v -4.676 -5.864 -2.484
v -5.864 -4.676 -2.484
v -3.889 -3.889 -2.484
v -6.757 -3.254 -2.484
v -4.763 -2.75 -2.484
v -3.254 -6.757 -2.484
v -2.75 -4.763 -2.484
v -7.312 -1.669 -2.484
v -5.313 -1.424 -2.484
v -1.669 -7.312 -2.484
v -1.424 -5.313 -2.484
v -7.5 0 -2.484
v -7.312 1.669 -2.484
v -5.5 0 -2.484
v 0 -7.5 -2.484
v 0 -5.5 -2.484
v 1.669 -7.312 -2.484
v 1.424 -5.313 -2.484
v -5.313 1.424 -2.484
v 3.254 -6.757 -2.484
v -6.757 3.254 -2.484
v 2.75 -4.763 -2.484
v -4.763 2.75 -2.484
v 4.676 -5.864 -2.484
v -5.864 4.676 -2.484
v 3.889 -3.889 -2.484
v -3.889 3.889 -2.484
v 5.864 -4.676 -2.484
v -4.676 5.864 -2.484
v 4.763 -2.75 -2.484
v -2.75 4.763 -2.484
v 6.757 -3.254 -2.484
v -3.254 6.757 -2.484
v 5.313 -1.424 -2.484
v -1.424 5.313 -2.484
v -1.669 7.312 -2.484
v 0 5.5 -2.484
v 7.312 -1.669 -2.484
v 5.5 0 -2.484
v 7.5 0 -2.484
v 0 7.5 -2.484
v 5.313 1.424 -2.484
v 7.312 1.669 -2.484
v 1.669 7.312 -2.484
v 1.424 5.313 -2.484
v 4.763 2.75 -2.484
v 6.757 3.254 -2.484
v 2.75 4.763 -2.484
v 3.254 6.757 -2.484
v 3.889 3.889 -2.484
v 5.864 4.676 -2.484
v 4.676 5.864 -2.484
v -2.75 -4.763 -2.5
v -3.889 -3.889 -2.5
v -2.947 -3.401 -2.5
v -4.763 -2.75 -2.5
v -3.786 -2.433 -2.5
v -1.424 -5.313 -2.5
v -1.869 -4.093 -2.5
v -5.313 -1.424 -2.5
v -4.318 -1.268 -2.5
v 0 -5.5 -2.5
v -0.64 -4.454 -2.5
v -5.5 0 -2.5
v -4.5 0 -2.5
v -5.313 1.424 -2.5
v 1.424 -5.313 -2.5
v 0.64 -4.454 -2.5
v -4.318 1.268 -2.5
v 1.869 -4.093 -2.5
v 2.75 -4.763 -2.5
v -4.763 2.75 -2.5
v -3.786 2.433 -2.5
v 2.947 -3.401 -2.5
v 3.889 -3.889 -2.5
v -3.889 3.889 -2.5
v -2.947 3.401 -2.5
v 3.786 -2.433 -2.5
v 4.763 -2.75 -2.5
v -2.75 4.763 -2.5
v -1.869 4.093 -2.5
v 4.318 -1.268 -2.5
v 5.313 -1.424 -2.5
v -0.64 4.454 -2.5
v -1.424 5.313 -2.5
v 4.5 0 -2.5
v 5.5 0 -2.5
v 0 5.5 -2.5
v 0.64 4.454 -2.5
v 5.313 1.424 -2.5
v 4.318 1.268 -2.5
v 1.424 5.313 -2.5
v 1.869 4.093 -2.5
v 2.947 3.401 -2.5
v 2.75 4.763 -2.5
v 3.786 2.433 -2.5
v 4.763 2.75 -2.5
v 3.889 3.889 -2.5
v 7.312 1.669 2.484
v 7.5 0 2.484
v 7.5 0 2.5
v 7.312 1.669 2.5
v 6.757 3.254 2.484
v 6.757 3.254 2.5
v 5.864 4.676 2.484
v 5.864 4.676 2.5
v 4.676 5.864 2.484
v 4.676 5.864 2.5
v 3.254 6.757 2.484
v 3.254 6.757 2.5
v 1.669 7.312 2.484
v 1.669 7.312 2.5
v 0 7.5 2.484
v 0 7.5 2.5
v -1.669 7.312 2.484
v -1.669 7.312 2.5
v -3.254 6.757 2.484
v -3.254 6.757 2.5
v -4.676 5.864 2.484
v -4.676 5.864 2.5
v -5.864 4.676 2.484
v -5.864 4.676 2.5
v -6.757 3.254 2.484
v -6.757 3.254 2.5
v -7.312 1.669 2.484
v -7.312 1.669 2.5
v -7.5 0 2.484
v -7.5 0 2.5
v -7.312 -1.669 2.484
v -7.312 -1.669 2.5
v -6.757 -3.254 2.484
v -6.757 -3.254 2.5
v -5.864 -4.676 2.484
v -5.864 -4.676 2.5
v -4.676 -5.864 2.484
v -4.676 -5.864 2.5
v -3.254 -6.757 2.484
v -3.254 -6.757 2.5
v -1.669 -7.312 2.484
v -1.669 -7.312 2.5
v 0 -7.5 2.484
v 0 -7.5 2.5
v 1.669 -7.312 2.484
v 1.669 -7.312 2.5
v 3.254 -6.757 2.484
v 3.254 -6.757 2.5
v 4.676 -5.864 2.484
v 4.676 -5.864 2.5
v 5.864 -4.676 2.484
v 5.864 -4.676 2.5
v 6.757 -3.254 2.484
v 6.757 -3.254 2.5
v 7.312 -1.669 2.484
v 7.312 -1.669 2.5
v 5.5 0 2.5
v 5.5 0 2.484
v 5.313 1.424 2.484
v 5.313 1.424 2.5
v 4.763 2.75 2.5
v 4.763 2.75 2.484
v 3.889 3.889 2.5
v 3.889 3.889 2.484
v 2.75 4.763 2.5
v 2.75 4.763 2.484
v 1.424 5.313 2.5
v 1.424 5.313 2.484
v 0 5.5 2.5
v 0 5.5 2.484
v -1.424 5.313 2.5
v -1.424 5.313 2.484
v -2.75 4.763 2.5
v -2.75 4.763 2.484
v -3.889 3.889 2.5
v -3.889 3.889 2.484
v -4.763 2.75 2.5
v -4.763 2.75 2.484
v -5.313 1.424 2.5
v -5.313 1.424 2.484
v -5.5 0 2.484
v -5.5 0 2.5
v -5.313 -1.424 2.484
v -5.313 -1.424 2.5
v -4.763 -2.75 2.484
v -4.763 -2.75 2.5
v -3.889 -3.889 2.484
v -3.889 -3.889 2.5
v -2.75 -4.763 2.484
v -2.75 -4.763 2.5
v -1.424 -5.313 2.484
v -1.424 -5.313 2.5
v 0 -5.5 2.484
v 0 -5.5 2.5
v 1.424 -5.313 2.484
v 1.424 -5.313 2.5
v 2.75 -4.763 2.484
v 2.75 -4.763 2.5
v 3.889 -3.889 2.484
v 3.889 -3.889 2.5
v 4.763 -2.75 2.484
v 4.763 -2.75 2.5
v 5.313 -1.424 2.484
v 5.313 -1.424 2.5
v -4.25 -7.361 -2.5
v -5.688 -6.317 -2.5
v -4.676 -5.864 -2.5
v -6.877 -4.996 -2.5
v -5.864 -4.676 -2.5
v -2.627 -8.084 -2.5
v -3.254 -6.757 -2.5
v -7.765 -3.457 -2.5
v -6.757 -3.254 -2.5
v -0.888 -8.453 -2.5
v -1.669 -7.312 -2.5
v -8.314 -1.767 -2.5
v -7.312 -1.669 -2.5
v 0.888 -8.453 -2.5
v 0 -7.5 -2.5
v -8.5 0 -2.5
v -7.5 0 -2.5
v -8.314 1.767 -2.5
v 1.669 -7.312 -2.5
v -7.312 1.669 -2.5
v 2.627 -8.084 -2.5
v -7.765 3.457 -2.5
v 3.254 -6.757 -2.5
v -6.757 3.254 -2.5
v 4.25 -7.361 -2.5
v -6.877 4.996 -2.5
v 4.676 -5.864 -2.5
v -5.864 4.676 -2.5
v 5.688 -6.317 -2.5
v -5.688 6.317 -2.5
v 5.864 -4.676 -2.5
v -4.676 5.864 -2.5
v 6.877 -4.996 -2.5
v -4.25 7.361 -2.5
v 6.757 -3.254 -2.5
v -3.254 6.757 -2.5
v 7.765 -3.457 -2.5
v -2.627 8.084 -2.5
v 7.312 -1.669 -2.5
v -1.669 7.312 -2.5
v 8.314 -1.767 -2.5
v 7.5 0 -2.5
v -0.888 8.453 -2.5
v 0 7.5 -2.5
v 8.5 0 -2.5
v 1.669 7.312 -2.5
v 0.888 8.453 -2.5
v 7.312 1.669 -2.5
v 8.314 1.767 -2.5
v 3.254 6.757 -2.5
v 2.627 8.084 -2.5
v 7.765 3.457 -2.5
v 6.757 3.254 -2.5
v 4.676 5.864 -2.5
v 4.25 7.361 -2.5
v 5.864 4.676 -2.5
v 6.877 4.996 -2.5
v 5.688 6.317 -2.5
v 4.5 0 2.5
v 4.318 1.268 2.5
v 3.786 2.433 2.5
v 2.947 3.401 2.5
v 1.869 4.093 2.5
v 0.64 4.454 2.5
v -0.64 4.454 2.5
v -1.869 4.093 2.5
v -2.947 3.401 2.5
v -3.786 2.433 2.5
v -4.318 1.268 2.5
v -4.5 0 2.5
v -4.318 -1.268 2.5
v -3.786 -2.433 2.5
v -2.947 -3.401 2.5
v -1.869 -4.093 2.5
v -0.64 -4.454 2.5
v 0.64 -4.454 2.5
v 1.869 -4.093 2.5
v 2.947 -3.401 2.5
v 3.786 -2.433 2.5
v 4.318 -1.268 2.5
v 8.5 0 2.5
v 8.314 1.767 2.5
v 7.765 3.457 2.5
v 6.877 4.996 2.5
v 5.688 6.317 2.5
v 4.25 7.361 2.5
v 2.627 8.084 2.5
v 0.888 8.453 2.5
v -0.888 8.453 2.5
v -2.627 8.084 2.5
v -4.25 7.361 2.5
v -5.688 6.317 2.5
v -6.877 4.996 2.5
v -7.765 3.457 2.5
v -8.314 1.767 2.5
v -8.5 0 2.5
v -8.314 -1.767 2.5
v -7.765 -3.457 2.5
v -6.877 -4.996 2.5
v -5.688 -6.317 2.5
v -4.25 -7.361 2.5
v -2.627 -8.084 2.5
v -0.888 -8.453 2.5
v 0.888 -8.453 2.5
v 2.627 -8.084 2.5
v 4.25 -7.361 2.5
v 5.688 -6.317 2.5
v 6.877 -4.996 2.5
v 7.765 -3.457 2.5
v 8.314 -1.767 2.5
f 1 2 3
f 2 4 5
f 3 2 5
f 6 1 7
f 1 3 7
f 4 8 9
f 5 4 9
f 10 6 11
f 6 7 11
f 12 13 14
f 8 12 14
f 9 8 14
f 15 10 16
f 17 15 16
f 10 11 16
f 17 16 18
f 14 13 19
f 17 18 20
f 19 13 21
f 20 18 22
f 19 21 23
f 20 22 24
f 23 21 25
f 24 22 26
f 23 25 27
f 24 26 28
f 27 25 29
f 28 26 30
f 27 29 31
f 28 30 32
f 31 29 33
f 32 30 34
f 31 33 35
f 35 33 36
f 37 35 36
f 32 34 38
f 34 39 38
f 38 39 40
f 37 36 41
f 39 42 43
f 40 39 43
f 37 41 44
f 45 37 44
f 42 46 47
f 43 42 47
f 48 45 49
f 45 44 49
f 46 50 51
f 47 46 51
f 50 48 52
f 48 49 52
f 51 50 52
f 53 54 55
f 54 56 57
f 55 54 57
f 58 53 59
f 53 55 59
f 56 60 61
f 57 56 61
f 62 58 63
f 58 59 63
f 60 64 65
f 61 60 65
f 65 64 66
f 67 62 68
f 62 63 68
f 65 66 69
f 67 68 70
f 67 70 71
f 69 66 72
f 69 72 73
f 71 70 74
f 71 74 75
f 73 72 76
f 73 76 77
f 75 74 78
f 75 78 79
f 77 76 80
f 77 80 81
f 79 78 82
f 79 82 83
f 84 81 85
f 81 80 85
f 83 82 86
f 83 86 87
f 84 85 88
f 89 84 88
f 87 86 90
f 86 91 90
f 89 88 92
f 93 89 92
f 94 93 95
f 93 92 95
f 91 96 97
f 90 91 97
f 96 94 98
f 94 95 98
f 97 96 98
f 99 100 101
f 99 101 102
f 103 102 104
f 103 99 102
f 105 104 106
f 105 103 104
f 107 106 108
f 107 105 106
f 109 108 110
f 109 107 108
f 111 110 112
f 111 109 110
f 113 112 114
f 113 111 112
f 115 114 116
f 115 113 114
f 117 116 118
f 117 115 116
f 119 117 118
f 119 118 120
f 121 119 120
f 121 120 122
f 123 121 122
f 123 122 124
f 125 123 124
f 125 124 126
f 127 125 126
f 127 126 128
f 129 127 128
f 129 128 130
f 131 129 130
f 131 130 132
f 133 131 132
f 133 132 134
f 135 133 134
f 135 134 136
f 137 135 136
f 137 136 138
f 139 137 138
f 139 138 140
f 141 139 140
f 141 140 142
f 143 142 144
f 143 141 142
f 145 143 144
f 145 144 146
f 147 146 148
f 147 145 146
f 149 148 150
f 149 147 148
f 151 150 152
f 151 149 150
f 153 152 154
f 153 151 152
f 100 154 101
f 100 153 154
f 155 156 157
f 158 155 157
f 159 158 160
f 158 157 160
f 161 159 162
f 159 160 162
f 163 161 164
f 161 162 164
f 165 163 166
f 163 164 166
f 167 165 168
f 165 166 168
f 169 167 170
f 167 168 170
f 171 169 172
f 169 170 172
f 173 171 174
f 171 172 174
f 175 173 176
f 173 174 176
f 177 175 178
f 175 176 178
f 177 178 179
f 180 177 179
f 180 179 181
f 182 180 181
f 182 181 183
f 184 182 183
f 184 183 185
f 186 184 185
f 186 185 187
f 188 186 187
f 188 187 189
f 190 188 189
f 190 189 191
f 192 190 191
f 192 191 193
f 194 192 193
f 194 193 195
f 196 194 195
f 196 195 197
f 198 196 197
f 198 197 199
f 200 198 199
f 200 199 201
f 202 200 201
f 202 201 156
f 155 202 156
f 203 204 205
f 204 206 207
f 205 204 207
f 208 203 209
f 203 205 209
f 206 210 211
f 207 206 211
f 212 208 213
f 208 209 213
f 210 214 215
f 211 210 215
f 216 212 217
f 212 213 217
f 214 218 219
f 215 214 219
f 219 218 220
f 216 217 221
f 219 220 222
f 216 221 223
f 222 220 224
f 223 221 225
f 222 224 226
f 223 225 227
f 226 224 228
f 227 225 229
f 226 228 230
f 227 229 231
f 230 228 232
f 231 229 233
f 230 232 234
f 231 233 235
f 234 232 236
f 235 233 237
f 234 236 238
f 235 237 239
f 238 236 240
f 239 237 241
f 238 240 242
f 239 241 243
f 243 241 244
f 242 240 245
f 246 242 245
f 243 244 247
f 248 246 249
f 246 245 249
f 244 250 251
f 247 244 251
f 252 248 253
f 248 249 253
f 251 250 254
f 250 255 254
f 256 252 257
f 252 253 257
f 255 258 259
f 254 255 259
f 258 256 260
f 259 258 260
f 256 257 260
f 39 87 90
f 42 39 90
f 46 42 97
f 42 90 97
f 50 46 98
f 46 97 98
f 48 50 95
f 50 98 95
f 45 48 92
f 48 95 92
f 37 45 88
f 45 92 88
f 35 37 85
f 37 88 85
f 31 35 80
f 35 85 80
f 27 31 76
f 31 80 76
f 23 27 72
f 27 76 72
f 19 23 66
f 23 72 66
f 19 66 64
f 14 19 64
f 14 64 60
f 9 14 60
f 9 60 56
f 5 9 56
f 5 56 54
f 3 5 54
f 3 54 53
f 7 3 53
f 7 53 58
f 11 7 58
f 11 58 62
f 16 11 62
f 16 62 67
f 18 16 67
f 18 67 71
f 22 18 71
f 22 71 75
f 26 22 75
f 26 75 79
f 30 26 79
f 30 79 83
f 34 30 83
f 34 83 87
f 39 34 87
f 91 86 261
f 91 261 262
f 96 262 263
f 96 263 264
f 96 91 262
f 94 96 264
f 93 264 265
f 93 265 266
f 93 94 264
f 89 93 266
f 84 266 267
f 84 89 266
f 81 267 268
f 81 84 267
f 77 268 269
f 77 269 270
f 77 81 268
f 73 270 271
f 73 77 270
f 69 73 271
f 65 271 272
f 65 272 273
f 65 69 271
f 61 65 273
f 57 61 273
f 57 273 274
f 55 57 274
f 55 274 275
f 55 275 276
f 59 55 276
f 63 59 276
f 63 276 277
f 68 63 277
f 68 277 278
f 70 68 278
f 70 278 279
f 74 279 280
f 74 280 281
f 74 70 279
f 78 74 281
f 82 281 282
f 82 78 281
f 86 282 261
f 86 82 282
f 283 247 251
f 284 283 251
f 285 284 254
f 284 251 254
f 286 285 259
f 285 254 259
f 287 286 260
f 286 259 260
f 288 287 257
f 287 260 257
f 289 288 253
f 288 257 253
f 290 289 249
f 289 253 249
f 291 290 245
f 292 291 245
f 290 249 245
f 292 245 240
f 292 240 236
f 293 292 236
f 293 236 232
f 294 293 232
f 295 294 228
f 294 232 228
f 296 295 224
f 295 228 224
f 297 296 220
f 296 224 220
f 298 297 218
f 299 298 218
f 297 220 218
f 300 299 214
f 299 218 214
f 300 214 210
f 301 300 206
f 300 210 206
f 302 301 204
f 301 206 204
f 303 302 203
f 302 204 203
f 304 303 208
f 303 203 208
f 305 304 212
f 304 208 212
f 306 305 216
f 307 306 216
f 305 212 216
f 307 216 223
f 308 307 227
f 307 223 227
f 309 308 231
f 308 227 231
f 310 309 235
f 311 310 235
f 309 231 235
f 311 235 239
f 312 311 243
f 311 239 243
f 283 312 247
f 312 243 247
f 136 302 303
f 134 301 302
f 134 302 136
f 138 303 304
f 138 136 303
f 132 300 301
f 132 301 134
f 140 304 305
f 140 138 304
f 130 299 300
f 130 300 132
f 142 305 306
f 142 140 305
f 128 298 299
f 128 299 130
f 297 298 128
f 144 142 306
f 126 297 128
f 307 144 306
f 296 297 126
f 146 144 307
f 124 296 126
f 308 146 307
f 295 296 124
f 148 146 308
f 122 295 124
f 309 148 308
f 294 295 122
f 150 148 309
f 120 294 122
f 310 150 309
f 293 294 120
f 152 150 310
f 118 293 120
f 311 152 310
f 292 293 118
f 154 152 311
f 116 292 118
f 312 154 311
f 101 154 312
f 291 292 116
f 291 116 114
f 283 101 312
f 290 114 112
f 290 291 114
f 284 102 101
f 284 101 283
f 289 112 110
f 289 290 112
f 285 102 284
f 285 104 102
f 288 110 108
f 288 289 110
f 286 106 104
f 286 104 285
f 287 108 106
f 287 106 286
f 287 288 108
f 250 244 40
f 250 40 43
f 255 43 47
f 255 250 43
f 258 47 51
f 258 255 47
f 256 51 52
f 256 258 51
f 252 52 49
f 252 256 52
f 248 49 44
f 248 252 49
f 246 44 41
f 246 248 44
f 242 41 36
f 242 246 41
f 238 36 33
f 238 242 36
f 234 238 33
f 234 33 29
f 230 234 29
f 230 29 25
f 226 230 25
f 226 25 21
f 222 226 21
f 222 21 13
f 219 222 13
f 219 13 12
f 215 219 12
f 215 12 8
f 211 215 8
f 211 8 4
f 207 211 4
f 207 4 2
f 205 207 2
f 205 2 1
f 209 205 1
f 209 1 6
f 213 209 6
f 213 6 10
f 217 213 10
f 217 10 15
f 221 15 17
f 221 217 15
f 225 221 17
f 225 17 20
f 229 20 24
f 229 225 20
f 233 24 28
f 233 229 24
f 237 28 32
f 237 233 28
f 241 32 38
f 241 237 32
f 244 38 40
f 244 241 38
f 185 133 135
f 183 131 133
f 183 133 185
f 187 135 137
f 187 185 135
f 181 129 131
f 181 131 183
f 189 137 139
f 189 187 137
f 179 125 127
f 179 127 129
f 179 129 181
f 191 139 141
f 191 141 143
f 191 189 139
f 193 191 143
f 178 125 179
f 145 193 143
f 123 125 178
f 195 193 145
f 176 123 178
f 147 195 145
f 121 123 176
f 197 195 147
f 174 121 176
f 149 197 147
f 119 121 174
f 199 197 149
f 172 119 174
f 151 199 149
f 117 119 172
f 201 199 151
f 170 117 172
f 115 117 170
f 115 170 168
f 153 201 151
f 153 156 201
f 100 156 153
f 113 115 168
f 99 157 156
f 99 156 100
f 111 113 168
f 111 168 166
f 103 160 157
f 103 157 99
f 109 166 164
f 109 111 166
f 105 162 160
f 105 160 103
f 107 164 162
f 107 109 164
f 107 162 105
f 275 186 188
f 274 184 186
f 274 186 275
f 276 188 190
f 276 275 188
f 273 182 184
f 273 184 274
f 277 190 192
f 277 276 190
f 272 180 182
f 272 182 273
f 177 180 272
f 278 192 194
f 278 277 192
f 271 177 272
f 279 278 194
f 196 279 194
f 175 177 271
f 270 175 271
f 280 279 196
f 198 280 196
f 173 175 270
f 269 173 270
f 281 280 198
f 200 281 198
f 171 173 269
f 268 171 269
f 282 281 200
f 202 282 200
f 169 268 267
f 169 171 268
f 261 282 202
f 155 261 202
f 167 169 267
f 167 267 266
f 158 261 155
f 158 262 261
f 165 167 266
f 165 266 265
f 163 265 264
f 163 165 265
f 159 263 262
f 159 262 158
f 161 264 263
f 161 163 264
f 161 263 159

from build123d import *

# Parameters (mm, degrees)
BOSS_EXTRUDE1_DEPTH        = 2.5
BOSS_EXTRUDE1_DEPTH_BACK   = 2.5
SKETCH1_R                  = 5.5
SKETCH1_R_2                = 4.5
BOSS_EXTRUDE1_2_DEPTH      = 2.5
BOSS_EXTRUDE1_2_DEPTH_BACK = 2.5
SKETCH1_R_3                = 8.5
SKETCH1_R_4                = 7.5
BOSS_EXTRUDE2_DEPTH        = 2.484375
BOSS_EXTRUDE2_DEPTH_BACK   = 2.484375
SKETCH1_3_R                = 7.5
SKETCH1_3_R_2              = 5.5


with BuildPart() as part:
    # Sketch1 → Boss-Extrude1 (new, two sides: drawn at the far end of the back side and taken through both)
    with BuildSketch(Plane.XY.offset(-BOSS_EXTRUDE1_DEPTH_BACK)):
        Circle(SKETCH1_R)
        Circle(SKETCH1_R_2, mode=Mode.SUBTRACT)
    extrude(amount=BOSS_EXTRUDE1_DEPTH + BOSS_EXTRUDE1_DEPTH_BACK)



with BuildPart() as body_2:
    # Sketch1 → Boss-Extrude1 2 (new, two sides: drawn at the far end of the back side and taken through both)
    with BuildSketch(Plane.XY.offset(-BOSS_EXTRUDE1_2_DEPTH_BACK)):
        Circle(SKETCH1_R_3)
        Circle(SKETCH1_R_4, mode=Mode.SUBTRACT)
    extrude(amount=BOSS_EXTRUDE1_2_DEPTH + BOSS_EXTRUDE1_2_DEPTH_BACK)


with BuildPart() as part_1:
    add(part.part)

    add(body_2.part)  # Boss-Extrude2 merges body 2
    # Sketch1<3> → Boss-Extrude2 (add, two sides: drawn at the far end of the back side and taken through both)
    with BuildSketch(Plane.XY.offset(-BOSS_EXTRUDE2_DEPTH_BACK)):
        Circle(SKETCH1_3_R)
        Circle(SKETCH1_3_R_2, mode=Mode.SUBTRACT)
    extrude(amount=BOSS_EXTRUDE2_DEPTH + BOSS_EXTRUDE2_DEPTH_BACK)


solid = part_1.part
